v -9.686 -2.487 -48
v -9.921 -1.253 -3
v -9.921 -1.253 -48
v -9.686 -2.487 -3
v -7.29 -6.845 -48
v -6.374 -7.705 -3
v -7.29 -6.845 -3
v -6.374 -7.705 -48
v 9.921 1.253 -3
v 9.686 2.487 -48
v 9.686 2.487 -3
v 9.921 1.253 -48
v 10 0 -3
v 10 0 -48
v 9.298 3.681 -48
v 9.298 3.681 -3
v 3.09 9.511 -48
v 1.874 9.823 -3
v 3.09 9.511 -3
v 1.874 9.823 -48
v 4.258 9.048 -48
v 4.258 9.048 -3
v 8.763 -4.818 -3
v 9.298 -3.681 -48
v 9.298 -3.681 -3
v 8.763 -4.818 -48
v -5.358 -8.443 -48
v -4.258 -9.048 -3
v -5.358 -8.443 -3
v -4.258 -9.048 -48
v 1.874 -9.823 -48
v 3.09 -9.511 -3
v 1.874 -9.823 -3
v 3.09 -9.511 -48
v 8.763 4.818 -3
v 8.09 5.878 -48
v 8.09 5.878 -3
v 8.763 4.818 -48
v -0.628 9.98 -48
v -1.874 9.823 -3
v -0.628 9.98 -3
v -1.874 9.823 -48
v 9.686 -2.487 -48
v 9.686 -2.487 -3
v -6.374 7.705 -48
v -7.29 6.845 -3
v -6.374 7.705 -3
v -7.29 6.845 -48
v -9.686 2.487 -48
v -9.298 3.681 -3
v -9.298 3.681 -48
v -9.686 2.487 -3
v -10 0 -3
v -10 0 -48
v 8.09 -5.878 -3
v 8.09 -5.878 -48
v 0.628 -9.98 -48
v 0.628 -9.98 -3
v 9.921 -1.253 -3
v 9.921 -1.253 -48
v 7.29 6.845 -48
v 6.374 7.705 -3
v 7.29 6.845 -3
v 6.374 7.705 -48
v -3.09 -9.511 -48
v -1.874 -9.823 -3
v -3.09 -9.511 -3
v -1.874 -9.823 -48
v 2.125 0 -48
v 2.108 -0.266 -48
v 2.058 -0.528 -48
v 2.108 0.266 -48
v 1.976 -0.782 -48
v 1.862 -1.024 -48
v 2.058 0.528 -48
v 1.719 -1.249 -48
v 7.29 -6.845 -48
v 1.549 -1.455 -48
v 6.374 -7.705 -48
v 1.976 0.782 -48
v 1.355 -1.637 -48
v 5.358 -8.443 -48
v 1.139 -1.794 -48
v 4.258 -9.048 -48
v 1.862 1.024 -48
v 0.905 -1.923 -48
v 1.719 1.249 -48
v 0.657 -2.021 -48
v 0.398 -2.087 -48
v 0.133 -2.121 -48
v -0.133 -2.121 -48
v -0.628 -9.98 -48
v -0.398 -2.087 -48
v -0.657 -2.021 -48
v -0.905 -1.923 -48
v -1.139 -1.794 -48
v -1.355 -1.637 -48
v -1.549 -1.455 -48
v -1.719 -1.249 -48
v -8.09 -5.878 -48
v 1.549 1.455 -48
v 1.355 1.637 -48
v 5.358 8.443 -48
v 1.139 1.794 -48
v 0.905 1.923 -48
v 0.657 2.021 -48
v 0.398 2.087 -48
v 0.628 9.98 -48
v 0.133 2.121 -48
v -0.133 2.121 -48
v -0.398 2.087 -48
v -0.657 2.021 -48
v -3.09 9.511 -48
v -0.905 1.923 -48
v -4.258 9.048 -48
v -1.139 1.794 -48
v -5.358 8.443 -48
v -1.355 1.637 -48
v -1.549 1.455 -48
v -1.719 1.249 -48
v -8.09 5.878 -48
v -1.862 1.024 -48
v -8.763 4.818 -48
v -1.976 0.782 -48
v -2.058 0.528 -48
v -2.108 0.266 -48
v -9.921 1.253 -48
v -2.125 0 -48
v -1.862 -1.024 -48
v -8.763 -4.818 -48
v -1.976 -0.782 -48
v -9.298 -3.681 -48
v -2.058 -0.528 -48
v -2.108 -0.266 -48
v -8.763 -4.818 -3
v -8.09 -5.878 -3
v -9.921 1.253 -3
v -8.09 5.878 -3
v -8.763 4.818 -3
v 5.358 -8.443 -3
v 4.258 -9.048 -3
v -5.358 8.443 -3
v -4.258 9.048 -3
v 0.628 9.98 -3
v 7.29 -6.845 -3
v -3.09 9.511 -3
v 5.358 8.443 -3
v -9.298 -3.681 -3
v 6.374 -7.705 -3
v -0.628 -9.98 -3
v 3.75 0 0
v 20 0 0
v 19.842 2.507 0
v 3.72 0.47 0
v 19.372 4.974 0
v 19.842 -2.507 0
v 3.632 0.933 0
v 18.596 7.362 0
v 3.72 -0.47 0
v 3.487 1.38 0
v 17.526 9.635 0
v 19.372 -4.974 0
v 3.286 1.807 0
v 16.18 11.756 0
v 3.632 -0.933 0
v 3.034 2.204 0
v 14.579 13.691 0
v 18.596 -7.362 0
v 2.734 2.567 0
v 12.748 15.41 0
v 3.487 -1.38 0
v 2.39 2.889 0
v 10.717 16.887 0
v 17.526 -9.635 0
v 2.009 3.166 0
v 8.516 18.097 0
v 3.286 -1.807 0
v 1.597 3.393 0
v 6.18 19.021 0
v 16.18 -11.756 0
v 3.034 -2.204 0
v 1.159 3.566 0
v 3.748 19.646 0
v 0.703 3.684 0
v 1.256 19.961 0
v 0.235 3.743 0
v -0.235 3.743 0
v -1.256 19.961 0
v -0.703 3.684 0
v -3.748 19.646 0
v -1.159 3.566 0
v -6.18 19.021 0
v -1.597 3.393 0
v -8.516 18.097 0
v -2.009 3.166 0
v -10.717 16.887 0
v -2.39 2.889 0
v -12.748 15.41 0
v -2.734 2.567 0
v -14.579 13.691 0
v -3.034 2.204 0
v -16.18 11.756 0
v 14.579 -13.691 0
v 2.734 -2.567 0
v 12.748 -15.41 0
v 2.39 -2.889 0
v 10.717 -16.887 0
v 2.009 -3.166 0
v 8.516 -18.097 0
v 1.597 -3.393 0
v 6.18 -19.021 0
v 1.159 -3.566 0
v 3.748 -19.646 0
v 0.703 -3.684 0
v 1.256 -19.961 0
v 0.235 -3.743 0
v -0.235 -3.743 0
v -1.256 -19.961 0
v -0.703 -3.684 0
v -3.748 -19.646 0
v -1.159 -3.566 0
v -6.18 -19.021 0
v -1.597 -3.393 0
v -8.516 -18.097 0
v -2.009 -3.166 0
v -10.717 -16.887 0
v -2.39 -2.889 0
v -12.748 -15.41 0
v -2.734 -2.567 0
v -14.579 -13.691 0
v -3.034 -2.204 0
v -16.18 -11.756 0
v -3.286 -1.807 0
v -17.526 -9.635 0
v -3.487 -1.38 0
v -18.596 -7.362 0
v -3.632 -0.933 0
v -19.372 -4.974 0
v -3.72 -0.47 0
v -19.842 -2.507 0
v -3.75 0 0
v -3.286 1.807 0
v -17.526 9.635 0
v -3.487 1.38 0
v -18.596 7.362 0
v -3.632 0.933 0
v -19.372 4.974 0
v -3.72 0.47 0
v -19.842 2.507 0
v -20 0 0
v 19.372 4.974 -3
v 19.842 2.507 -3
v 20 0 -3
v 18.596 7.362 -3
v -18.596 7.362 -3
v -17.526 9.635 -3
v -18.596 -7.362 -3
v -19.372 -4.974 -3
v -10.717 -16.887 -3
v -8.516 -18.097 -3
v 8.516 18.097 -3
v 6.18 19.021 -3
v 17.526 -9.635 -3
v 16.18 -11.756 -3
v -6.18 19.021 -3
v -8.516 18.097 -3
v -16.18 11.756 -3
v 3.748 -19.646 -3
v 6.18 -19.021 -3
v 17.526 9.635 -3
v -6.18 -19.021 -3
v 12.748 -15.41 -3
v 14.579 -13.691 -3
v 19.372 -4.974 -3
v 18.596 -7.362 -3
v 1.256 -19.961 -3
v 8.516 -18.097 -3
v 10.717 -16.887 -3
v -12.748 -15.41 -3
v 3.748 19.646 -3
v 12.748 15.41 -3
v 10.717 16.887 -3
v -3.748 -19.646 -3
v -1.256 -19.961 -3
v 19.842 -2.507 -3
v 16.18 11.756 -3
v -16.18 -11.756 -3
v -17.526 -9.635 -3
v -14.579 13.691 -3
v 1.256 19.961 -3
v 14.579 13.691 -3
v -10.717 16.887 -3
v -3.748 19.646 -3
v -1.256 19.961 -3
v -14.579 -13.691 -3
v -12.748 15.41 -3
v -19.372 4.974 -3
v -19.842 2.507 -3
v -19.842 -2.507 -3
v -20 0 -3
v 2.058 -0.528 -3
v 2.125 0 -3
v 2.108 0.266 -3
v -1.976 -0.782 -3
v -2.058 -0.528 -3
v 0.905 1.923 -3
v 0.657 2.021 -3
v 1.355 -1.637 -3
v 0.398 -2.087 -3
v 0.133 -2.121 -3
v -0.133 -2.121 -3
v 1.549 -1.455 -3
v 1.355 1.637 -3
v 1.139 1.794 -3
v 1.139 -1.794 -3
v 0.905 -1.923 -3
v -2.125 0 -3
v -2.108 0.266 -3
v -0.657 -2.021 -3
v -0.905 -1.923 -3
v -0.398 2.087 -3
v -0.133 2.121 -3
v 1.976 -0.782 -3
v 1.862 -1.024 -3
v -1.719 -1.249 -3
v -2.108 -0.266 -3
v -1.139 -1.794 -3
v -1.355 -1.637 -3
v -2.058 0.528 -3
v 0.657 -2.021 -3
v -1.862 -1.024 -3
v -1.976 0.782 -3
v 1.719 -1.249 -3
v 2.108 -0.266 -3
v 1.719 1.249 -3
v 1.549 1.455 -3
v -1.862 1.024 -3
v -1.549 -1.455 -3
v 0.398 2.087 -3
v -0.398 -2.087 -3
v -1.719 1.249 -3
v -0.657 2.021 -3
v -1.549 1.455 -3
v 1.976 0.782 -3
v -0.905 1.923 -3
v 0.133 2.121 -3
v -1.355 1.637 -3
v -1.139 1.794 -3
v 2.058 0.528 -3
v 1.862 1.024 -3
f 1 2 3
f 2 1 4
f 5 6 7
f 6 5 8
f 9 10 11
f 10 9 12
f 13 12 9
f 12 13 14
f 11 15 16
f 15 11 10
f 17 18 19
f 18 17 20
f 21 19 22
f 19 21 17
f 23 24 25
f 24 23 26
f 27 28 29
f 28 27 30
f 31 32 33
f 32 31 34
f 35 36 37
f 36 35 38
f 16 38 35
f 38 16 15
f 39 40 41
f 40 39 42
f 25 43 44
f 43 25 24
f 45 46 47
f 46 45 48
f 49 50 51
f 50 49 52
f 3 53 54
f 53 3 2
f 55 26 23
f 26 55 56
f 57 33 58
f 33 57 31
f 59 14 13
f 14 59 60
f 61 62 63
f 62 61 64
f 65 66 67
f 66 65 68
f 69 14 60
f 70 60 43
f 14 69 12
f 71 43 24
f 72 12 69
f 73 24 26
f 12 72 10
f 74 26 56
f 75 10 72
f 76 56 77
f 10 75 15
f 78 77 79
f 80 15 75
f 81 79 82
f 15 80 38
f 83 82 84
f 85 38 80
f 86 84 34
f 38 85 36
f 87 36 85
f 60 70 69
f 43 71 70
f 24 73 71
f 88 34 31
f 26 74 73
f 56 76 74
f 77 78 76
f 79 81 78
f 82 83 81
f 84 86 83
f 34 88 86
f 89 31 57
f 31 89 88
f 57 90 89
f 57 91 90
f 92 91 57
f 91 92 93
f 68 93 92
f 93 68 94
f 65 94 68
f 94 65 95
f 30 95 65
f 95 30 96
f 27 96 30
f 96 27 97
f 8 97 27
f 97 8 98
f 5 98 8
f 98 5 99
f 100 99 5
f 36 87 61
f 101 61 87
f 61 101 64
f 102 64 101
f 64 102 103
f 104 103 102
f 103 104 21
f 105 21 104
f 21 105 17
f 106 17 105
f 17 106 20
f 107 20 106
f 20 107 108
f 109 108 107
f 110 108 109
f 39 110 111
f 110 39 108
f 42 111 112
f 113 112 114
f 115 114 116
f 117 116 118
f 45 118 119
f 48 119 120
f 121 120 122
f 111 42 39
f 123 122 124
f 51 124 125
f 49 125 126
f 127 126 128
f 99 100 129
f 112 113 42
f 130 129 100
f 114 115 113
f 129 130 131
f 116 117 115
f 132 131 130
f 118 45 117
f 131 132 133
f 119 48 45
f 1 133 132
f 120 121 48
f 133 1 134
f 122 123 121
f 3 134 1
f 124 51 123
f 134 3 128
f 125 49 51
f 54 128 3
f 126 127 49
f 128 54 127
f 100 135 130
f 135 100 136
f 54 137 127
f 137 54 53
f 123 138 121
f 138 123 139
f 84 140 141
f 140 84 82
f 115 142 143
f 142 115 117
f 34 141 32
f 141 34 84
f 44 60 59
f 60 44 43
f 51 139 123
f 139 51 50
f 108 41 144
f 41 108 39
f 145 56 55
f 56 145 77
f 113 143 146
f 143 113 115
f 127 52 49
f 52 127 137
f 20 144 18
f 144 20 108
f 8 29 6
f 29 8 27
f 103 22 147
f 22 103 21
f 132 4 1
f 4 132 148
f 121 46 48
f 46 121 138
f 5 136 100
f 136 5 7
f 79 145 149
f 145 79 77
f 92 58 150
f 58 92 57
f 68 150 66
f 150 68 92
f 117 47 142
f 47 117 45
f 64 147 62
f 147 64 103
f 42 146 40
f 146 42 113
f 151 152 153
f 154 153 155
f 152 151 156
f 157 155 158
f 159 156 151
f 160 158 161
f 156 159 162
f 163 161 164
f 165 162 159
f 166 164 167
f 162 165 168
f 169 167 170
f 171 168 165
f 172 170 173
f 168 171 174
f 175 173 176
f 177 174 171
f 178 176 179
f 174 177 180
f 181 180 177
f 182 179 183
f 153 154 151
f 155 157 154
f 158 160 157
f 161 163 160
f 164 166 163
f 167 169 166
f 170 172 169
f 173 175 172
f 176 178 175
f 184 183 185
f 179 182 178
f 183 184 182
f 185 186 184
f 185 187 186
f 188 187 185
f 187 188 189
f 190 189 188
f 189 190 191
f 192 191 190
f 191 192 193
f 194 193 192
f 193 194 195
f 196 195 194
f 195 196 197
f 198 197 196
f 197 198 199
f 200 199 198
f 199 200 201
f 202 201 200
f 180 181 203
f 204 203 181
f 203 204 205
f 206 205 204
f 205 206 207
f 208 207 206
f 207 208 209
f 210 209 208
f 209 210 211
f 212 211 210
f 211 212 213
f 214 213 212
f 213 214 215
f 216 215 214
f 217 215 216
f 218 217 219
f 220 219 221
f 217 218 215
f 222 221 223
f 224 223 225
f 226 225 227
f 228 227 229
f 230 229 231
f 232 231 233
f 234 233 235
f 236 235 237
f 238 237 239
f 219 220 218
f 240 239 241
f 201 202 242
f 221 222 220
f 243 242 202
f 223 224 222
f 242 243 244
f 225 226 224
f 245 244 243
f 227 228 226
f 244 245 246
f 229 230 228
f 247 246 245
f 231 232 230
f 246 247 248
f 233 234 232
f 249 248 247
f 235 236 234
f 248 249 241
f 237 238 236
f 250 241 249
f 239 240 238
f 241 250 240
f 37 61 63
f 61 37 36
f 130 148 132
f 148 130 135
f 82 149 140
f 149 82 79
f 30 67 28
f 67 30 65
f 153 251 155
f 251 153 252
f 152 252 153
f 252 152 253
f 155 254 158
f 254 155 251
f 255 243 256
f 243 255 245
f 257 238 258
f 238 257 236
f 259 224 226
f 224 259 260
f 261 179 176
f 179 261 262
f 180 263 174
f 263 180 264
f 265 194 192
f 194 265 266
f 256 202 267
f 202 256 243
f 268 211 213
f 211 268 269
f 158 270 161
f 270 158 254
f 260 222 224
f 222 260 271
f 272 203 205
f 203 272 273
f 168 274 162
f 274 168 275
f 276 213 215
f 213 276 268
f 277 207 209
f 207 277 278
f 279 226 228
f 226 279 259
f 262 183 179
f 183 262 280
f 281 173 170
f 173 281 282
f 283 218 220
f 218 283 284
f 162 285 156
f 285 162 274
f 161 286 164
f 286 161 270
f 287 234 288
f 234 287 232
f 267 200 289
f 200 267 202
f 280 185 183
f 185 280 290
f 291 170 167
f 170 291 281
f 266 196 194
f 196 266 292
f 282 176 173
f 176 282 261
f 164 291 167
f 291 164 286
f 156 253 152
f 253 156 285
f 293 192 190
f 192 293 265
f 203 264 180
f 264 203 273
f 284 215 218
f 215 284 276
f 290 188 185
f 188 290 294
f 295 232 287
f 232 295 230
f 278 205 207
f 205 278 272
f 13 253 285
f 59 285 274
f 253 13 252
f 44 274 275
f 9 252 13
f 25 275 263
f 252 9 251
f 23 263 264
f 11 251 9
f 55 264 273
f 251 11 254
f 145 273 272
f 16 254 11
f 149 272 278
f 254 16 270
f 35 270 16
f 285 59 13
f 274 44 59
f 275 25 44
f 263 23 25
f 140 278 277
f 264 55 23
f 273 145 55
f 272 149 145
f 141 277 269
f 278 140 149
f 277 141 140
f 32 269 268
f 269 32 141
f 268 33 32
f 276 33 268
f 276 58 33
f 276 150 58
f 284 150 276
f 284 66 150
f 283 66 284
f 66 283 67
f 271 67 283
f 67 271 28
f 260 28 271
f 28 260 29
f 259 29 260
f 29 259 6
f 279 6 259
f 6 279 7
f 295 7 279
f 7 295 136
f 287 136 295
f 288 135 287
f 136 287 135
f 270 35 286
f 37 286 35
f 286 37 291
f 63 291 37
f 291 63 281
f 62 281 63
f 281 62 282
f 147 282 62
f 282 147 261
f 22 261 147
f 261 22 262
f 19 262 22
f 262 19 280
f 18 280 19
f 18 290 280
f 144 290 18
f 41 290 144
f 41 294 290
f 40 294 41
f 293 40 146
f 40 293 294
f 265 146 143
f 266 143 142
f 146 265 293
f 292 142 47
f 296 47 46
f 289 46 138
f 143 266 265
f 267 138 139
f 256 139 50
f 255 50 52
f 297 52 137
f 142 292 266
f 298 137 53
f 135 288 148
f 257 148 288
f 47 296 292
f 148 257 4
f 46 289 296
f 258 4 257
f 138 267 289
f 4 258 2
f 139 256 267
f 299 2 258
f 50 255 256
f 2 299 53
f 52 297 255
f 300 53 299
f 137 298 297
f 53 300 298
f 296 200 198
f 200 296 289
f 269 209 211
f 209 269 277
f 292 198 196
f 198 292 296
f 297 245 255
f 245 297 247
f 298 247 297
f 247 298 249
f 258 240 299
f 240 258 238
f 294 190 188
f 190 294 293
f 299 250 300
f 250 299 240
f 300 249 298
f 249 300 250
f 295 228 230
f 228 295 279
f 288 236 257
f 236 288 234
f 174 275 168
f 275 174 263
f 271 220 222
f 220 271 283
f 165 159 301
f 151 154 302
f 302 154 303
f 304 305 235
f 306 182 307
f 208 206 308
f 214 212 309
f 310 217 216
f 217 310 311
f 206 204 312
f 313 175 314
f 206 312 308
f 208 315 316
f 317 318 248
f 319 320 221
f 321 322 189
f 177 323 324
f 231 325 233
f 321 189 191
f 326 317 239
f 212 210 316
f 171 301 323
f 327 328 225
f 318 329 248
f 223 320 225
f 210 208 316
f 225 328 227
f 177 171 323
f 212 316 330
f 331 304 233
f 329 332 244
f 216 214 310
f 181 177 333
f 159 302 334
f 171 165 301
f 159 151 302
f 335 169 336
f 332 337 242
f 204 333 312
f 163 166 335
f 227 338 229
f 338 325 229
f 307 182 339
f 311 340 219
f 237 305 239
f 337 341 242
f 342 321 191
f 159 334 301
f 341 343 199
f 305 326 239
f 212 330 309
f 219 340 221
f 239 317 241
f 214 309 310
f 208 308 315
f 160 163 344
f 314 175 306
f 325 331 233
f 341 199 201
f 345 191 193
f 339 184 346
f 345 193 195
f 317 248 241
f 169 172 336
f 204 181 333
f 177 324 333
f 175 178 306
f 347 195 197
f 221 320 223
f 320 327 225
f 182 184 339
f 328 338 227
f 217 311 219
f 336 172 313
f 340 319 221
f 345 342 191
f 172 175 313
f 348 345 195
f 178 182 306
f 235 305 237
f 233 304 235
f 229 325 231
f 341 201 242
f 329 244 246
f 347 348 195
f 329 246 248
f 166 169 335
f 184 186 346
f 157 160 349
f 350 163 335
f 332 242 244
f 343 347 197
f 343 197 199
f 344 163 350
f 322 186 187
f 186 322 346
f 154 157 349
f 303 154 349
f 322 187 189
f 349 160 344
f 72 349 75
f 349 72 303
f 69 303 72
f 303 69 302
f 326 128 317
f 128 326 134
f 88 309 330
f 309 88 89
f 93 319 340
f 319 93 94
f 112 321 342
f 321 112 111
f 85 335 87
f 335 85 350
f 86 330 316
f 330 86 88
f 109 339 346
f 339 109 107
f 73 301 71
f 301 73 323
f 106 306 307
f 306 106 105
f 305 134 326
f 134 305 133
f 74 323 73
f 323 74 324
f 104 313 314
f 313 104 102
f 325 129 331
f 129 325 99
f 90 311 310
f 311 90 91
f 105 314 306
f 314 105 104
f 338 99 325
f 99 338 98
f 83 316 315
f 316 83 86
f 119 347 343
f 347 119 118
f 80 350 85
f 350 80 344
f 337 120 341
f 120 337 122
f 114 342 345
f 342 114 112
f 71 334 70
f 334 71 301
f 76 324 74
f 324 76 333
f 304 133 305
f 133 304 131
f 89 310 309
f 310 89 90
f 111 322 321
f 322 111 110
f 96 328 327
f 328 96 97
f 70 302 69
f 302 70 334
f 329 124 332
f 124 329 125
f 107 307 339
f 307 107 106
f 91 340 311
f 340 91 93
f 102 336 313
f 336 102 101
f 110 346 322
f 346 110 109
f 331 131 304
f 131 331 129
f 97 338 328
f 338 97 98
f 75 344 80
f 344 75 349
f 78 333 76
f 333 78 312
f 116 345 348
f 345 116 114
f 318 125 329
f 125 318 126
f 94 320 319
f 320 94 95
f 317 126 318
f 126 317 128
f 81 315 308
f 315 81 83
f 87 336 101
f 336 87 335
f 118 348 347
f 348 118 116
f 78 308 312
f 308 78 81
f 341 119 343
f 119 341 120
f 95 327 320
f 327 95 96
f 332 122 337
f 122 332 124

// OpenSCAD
$fn = 50;


difference() {
	union() {
		translate(v = [0, 0, -48.0000000000]) {
			cylinder(h = 48, r = 10.0000000000);
		}
		translate(v = [0, 0, -3.0000000000]) {
			cylinder(h = 3, r = 20.0000000000);
		}
	}
	union() {
		translate(v = [0, 0, 0]) {
			rotate(a = [0, 0, 0]) {
				difference() {
					union() {
						#translate(v = [0, 0, -48.0000000000]) {
							cylinder(h = 48, r = 2.0000000000);
						}
						#translate(v = [0, 0, -3]) {
							cylinder(h = 3, r = 10.0000000000, r1 = 2.1250000000, r2 = 3.7500000000);
						}
						#translate(v = [0, 0, -48.0000000000]) {
							cylinder(h = 48, r = 2.1250000000);
						}
						#translate(v = [0, 0, -48.0000000000]) {
							cylinder(h = 48, r = 2.0000000000);
						}
					}
					union();
				}
			}
		}
	}
}
